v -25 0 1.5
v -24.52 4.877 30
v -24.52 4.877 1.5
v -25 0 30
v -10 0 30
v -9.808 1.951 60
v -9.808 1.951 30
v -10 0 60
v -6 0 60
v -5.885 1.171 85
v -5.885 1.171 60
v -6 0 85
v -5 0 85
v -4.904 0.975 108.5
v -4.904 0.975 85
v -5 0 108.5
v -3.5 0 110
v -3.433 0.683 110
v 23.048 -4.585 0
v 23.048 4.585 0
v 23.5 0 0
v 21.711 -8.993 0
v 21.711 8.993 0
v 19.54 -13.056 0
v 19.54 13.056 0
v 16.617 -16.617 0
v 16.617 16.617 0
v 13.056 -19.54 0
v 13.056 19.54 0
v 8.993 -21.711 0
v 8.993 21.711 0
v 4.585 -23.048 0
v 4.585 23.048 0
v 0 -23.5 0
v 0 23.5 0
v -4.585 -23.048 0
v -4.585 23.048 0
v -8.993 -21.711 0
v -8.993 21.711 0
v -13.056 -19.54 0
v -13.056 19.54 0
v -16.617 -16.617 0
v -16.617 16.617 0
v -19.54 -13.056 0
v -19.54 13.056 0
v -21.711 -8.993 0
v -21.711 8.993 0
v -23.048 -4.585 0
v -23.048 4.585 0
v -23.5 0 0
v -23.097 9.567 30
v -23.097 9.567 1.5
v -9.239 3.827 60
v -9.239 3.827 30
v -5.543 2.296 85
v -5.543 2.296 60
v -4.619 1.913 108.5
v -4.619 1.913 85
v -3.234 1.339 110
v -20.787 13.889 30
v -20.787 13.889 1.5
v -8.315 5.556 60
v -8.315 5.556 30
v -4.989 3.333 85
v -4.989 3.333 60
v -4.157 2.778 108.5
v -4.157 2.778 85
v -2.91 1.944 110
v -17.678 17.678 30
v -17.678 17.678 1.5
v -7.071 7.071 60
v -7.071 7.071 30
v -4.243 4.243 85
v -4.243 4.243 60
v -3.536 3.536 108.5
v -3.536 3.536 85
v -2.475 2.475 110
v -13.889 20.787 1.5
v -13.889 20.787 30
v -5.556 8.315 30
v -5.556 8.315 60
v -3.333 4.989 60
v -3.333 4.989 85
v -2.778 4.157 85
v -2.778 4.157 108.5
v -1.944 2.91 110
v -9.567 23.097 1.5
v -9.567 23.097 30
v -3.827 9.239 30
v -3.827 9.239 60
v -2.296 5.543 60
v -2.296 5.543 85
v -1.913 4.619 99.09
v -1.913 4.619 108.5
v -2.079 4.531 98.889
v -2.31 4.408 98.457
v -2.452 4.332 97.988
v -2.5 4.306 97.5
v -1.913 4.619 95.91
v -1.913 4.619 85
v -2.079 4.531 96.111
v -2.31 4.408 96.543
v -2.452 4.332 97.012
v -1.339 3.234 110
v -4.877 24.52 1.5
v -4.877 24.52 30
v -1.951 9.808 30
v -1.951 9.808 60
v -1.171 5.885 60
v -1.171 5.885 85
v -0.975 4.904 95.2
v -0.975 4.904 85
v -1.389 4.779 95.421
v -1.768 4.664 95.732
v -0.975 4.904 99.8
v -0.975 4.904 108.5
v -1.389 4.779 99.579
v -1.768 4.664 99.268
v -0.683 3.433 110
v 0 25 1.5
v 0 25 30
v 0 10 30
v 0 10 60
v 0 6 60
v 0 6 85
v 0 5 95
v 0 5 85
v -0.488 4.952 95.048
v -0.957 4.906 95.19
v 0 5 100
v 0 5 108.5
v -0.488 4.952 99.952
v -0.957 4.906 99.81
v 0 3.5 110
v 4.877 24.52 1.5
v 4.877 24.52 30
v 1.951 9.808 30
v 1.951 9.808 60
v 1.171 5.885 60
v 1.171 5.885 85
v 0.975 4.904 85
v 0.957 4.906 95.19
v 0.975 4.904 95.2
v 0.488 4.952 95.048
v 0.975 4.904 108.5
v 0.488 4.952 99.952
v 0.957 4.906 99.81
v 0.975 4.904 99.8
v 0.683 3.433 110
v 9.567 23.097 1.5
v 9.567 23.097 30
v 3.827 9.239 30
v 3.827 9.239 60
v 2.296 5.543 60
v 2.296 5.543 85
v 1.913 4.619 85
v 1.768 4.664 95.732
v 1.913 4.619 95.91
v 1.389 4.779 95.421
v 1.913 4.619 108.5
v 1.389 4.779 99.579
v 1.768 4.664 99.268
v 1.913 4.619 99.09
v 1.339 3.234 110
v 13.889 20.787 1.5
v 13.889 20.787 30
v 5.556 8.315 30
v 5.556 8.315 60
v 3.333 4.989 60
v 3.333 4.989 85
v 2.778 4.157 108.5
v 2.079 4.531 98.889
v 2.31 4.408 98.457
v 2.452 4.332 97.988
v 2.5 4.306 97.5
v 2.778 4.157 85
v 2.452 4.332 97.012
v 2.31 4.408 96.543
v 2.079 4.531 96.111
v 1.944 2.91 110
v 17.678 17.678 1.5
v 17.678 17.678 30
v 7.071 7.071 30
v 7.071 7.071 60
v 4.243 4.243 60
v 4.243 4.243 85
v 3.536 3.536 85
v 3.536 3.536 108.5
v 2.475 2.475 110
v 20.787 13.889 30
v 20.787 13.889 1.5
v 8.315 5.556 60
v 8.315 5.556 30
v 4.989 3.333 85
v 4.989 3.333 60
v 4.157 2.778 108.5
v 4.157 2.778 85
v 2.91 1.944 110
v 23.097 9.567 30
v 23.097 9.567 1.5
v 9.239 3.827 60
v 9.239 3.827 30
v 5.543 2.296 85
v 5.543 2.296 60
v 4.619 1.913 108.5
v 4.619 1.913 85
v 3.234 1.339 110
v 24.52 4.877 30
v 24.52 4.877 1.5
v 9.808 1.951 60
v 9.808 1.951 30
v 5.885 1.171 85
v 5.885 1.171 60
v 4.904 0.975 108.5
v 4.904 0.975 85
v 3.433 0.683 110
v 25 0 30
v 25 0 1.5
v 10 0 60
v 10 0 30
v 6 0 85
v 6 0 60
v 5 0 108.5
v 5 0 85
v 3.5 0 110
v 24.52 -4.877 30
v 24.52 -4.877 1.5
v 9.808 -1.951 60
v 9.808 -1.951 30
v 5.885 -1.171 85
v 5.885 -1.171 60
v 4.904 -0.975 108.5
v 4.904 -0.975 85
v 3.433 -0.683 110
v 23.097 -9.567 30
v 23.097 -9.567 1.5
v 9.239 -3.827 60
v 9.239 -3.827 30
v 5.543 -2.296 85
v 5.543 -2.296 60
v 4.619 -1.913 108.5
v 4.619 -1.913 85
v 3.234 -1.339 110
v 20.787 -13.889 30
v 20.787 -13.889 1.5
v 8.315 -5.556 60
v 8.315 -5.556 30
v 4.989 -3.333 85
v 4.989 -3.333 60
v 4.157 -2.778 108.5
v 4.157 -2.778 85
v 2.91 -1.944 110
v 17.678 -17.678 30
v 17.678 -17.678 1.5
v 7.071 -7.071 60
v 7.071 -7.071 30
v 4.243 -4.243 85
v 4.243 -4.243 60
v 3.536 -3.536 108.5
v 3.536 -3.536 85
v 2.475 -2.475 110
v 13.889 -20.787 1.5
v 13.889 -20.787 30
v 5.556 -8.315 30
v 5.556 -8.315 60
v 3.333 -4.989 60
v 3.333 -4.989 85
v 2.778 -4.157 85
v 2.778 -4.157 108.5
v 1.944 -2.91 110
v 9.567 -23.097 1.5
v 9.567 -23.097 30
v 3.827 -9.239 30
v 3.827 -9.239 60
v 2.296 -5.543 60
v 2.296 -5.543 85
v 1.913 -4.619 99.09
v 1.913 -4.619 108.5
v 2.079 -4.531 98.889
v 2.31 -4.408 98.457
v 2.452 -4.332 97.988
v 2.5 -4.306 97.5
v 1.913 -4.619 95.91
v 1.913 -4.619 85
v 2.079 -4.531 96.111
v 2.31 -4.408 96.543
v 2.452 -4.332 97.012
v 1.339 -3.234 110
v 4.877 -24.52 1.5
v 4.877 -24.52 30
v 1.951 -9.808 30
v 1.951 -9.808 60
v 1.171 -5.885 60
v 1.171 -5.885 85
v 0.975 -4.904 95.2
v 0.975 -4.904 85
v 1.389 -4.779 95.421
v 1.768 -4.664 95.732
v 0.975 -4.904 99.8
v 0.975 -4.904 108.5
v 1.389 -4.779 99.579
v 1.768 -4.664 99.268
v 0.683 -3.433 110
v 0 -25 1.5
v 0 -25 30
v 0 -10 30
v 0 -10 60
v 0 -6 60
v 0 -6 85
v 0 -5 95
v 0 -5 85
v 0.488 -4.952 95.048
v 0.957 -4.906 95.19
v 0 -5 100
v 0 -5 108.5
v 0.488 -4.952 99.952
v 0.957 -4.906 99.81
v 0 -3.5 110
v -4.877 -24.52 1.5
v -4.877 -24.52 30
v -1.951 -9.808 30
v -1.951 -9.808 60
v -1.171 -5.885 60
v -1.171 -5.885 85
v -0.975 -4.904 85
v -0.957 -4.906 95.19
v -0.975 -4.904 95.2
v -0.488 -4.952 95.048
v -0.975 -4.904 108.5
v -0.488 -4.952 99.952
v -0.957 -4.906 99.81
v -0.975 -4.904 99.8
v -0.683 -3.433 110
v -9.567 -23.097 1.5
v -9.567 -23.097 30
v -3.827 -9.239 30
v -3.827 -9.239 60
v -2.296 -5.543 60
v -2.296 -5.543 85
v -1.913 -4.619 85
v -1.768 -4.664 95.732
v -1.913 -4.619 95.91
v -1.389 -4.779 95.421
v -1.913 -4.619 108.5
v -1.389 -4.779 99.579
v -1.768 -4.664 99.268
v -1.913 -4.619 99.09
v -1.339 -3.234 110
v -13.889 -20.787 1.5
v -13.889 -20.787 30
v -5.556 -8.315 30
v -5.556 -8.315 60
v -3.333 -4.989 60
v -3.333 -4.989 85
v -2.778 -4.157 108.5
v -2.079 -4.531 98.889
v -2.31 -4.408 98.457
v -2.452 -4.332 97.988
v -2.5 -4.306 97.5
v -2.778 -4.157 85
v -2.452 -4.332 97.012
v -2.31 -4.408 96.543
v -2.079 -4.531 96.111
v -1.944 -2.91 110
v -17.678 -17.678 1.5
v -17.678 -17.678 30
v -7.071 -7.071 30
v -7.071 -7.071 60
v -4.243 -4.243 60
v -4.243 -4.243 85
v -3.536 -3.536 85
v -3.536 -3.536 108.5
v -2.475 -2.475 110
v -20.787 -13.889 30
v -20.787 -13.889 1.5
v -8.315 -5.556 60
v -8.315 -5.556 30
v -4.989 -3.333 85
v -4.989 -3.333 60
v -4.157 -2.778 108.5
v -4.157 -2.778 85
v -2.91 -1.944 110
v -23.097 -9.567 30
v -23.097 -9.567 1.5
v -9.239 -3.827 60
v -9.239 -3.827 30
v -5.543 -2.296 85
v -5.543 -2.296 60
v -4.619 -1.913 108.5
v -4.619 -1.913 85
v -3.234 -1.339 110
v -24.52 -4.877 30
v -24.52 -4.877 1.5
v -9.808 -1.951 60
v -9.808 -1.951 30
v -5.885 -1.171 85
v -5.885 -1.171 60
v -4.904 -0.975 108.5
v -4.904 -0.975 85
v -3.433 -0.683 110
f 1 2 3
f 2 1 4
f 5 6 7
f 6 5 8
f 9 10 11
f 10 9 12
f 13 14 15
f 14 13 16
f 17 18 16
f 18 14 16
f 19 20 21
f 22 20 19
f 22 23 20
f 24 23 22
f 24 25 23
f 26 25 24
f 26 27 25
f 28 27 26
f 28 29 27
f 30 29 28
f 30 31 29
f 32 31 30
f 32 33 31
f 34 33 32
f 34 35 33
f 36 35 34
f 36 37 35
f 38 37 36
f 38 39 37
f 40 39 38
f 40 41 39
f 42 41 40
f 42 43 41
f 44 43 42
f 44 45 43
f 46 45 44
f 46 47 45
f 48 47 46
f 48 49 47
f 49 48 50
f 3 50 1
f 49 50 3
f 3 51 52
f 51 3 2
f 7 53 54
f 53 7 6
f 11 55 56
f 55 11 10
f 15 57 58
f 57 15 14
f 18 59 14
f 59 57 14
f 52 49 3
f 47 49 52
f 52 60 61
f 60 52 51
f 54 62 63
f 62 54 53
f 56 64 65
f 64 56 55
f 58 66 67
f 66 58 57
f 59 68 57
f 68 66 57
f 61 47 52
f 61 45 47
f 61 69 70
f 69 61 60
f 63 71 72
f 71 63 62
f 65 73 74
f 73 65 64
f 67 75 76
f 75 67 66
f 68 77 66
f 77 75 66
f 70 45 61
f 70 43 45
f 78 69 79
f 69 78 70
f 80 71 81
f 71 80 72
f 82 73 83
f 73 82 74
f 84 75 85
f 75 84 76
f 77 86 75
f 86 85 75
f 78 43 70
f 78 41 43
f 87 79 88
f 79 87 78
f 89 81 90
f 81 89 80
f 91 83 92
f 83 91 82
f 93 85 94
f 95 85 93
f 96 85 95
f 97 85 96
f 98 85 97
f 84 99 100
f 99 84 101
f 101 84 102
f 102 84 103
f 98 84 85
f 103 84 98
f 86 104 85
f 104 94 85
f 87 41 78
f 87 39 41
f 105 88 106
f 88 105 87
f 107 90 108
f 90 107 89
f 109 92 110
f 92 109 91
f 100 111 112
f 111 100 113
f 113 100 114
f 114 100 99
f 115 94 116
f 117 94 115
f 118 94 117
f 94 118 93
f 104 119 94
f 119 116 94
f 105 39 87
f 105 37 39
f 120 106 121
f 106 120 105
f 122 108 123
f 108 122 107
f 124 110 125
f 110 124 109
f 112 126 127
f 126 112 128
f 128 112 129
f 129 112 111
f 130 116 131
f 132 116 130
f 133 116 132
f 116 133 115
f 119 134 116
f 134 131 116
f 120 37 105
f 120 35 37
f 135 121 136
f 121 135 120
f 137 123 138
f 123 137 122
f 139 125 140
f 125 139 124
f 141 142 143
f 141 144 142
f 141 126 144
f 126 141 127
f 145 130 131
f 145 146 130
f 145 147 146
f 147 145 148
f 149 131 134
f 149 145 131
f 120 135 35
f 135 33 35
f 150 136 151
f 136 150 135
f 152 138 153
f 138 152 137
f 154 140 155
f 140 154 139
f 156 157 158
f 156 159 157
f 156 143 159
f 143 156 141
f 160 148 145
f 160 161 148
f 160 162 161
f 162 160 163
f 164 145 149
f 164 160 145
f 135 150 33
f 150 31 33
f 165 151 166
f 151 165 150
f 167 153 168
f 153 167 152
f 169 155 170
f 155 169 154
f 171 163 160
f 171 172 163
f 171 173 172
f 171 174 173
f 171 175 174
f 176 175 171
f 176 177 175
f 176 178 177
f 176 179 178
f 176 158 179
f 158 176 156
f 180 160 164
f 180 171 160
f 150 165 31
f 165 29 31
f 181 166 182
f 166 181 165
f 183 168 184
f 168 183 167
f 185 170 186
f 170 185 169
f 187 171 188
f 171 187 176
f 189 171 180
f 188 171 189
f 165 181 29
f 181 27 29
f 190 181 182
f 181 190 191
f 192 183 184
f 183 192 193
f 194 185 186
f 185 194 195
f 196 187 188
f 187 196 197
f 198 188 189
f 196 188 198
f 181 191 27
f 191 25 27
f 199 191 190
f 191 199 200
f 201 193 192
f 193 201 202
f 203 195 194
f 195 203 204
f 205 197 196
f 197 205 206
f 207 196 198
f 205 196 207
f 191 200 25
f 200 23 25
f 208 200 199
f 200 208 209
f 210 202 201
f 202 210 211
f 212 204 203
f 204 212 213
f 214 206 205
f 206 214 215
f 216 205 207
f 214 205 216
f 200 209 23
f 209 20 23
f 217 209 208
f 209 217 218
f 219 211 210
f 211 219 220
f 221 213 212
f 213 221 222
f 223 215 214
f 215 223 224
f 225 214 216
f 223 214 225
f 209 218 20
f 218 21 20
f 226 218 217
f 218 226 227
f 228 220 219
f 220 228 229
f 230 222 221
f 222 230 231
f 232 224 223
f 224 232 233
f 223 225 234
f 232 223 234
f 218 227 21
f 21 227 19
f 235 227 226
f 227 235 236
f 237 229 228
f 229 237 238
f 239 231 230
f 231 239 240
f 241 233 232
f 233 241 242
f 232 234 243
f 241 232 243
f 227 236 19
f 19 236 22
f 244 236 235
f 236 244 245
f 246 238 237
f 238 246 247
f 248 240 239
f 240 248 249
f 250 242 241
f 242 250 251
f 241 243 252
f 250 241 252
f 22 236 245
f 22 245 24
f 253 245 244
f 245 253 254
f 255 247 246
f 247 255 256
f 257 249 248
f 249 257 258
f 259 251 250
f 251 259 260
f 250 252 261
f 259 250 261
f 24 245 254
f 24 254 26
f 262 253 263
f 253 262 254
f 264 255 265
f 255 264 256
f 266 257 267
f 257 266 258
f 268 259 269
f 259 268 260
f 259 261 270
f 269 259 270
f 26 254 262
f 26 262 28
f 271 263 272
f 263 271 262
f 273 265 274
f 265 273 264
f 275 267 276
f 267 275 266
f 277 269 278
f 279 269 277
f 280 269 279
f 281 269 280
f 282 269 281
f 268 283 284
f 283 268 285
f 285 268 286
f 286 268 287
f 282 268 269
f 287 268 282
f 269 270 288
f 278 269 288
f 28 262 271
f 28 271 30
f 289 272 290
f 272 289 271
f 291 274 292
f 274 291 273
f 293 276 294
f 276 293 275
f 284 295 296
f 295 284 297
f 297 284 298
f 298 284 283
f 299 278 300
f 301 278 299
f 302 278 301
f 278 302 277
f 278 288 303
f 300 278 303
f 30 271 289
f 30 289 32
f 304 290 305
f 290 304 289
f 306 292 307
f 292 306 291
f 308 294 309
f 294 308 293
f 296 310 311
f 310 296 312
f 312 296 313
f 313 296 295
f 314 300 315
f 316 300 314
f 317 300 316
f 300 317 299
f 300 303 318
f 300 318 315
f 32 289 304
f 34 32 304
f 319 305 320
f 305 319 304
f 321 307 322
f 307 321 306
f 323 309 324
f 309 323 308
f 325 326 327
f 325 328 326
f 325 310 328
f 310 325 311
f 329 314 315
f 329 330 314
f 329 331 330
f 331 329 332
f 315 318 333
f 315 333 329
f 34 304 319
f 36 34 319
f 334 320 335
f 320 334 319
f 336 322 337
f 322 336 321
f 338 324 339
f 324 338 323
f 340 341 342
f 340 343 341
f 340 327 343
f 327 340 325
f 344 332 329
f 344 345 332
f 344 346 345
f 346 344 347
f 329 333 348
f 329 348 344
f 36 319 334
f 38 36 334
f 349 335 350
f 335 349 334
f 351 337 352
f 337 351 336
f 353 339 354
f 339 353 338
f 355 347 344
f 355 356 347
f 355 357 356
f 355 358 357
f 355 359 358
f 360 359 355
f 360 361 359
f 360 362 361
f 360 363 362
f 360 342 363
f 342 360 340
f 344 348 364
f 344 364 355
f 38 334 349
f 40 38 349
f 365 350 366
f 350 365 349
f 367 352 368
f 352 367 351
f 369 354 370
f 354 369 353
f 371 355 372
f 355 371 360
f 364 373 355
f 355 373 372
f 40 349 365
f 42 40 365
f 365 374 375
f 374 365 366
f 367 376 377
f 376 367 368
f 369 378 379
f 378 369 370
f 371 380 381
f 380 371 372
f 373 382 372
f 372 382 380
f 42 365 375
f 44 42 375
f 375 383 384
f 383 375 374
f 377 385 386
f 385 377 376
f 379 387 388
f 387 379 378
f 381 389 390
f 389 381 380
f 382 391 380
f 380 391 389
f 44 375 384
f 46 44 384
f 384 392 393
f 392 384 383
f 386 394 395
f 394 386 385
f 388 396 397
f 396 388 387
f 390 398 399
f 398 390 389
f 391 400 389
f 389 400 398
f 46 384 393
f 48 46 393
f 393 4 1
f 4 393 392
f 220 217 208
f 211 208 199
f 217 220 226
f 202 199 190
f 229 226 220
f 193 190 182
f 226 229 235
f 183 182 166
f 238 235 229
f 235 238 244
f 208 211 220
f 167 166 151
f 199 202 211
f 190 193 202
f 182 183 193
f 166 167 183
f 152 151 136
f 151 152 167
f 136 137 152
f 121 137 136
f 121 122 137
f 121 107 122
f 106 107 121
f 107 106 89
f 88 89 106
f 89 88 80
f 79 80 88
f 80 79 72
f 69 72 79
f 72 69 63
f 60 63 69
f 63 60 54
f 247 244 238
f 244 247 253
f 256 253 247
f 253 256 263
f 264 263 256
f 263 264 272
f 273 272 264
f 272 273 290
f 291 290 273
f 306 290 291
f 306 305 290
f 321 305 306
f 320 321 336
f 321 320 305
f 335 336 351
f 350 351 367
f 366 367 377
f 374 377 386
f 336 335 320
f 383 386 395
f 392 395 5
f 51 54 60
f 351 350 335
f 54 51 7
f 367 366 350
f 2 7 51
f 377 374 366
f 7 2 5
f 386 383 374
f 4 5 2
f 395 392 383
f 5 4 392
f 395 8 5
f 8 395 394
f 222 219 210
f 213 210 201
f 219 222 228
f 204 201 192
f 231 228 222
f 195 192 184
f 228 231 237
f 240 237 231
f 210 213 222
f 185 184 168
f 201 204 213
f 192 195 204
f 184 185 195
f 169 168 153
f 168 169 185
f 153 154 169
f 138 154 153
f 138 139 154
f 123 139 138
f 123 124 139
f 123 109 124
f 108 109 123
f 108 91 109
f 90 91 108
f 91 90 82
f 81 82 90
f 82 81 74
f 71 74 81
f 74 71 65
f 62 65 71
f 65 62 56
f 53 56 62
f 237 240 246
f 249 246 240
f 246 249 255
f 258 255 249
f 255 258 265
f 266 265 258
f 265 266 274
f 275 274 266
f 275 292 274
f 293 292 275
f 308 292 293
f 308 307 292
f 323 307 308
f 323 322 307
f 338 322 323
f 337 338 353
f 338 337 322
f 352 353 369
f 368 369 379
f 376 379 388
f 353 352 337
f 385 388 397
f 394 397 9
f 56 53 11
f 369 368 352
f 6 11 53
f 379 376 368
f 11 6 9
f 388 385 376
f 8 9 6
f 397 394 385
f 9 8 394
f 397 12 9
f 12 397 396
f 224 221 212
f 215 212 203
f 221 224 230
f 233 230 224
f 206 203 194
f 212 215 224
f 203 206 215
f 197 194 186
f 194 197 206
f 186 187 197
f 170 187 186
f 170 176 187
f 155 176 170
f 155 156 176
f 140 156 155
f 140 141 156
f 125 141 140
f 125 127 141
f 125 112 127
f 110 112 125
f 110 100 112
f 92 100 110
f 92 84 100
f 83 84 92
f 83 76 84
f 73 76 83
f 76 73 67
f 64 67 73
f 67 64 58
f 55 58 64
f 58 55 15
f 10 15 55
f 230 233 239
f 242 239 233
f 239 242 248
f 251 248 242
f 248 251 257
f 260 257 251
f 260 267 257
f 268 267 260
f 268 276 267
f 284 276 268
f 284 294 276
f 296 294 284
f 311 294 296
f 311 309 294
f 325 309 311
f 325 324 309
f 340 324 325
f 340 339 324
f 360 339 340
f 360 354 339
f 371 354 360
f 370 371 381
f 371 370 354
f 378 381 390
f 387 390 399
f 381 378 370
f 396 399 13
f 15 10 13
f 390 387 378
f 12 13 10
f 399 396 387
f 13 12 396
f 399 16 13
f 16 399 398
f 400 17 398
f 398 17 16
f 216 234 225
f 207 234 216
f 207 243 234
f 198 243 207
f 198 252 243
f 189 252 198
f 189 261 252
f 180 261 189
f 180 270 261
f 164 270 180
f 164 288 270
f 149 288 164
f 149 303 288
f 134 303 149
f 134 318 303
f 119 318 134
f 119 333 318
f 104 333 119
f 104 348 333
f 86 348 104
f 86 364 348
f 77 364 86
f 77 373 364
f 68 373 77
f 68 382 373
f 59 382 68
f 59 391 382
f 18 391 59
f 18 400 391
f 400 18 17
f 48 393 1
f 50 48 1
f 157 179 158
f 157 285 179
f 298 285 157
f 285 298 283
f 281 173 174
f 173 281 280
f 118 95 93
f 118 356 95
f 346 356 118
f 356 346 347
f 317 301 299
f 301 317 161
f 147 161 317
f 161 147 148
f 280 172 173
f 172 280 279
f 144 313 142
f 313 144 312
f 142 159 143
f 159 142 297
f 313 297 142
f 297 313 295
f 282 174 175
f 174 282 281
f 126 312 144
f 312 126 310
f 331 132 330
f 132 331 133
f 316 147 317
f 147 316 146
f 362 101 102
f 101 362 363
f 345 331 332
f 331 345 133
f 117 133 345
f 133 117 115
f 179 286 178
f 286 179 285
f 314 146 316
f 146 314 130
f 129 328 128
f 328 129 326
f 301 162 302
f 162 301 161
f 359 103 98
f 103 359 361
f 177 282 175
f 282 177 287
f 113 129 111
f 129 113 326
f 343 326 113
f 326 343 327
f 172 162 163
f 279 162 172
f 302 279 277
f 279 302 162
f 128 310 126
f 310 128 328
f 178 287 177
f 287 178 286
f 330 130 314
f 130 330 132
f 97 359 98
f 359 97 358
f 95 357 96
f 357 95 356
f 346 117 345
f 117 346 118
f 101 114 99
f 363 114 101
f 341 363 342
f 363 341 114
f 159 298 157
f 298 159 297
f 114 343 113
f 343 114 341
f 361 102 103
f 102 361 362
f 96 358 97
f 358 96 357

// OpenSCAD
$fn = 32;

// ----------------------------------------------------------------------
// Stepped shaft: diameters 50, 20, 12, 10 mm, 110 mm long
// ----------------------------------------------------------------------

// --- parameters (mm) ---
d1 = 50;                  // step 1 diameter
len1 = 30;                // step 1 length
d2 = 20;                  // step 2 diameter
len2 = 30;                // step 2 length
d3 = 12;                  // step 3 diameter
len3 = 25;                // step 3 length
d4 = 10;                  // step 4 diameter
len4 = 25;                // step 4 length
total = 110;              // overall length
chamfer = 1.5;            // end chamfer
cross_d = 5;              // cross pin hole
cross_z = 97.5;           // cross hole position

/* closed turning profile: x is the radius, y is the length */
profile = [[0, 0], [25 - chamfer, 0], [25, chamfer], [25, 30], [10, 30], [10, 60], [6, 60], [6, 85], [5, 85], [5, 108.5], [3.5, 110], [0, 110]];

difference() {
  rotate_extrude() polygon(profile);
  /* cross pin hole through the small step */
  translate([0, 0, cross_z]) rotate([90, 0, 0]) cylinder(h = d4 + 4, d = cross_d, center = true);
}
